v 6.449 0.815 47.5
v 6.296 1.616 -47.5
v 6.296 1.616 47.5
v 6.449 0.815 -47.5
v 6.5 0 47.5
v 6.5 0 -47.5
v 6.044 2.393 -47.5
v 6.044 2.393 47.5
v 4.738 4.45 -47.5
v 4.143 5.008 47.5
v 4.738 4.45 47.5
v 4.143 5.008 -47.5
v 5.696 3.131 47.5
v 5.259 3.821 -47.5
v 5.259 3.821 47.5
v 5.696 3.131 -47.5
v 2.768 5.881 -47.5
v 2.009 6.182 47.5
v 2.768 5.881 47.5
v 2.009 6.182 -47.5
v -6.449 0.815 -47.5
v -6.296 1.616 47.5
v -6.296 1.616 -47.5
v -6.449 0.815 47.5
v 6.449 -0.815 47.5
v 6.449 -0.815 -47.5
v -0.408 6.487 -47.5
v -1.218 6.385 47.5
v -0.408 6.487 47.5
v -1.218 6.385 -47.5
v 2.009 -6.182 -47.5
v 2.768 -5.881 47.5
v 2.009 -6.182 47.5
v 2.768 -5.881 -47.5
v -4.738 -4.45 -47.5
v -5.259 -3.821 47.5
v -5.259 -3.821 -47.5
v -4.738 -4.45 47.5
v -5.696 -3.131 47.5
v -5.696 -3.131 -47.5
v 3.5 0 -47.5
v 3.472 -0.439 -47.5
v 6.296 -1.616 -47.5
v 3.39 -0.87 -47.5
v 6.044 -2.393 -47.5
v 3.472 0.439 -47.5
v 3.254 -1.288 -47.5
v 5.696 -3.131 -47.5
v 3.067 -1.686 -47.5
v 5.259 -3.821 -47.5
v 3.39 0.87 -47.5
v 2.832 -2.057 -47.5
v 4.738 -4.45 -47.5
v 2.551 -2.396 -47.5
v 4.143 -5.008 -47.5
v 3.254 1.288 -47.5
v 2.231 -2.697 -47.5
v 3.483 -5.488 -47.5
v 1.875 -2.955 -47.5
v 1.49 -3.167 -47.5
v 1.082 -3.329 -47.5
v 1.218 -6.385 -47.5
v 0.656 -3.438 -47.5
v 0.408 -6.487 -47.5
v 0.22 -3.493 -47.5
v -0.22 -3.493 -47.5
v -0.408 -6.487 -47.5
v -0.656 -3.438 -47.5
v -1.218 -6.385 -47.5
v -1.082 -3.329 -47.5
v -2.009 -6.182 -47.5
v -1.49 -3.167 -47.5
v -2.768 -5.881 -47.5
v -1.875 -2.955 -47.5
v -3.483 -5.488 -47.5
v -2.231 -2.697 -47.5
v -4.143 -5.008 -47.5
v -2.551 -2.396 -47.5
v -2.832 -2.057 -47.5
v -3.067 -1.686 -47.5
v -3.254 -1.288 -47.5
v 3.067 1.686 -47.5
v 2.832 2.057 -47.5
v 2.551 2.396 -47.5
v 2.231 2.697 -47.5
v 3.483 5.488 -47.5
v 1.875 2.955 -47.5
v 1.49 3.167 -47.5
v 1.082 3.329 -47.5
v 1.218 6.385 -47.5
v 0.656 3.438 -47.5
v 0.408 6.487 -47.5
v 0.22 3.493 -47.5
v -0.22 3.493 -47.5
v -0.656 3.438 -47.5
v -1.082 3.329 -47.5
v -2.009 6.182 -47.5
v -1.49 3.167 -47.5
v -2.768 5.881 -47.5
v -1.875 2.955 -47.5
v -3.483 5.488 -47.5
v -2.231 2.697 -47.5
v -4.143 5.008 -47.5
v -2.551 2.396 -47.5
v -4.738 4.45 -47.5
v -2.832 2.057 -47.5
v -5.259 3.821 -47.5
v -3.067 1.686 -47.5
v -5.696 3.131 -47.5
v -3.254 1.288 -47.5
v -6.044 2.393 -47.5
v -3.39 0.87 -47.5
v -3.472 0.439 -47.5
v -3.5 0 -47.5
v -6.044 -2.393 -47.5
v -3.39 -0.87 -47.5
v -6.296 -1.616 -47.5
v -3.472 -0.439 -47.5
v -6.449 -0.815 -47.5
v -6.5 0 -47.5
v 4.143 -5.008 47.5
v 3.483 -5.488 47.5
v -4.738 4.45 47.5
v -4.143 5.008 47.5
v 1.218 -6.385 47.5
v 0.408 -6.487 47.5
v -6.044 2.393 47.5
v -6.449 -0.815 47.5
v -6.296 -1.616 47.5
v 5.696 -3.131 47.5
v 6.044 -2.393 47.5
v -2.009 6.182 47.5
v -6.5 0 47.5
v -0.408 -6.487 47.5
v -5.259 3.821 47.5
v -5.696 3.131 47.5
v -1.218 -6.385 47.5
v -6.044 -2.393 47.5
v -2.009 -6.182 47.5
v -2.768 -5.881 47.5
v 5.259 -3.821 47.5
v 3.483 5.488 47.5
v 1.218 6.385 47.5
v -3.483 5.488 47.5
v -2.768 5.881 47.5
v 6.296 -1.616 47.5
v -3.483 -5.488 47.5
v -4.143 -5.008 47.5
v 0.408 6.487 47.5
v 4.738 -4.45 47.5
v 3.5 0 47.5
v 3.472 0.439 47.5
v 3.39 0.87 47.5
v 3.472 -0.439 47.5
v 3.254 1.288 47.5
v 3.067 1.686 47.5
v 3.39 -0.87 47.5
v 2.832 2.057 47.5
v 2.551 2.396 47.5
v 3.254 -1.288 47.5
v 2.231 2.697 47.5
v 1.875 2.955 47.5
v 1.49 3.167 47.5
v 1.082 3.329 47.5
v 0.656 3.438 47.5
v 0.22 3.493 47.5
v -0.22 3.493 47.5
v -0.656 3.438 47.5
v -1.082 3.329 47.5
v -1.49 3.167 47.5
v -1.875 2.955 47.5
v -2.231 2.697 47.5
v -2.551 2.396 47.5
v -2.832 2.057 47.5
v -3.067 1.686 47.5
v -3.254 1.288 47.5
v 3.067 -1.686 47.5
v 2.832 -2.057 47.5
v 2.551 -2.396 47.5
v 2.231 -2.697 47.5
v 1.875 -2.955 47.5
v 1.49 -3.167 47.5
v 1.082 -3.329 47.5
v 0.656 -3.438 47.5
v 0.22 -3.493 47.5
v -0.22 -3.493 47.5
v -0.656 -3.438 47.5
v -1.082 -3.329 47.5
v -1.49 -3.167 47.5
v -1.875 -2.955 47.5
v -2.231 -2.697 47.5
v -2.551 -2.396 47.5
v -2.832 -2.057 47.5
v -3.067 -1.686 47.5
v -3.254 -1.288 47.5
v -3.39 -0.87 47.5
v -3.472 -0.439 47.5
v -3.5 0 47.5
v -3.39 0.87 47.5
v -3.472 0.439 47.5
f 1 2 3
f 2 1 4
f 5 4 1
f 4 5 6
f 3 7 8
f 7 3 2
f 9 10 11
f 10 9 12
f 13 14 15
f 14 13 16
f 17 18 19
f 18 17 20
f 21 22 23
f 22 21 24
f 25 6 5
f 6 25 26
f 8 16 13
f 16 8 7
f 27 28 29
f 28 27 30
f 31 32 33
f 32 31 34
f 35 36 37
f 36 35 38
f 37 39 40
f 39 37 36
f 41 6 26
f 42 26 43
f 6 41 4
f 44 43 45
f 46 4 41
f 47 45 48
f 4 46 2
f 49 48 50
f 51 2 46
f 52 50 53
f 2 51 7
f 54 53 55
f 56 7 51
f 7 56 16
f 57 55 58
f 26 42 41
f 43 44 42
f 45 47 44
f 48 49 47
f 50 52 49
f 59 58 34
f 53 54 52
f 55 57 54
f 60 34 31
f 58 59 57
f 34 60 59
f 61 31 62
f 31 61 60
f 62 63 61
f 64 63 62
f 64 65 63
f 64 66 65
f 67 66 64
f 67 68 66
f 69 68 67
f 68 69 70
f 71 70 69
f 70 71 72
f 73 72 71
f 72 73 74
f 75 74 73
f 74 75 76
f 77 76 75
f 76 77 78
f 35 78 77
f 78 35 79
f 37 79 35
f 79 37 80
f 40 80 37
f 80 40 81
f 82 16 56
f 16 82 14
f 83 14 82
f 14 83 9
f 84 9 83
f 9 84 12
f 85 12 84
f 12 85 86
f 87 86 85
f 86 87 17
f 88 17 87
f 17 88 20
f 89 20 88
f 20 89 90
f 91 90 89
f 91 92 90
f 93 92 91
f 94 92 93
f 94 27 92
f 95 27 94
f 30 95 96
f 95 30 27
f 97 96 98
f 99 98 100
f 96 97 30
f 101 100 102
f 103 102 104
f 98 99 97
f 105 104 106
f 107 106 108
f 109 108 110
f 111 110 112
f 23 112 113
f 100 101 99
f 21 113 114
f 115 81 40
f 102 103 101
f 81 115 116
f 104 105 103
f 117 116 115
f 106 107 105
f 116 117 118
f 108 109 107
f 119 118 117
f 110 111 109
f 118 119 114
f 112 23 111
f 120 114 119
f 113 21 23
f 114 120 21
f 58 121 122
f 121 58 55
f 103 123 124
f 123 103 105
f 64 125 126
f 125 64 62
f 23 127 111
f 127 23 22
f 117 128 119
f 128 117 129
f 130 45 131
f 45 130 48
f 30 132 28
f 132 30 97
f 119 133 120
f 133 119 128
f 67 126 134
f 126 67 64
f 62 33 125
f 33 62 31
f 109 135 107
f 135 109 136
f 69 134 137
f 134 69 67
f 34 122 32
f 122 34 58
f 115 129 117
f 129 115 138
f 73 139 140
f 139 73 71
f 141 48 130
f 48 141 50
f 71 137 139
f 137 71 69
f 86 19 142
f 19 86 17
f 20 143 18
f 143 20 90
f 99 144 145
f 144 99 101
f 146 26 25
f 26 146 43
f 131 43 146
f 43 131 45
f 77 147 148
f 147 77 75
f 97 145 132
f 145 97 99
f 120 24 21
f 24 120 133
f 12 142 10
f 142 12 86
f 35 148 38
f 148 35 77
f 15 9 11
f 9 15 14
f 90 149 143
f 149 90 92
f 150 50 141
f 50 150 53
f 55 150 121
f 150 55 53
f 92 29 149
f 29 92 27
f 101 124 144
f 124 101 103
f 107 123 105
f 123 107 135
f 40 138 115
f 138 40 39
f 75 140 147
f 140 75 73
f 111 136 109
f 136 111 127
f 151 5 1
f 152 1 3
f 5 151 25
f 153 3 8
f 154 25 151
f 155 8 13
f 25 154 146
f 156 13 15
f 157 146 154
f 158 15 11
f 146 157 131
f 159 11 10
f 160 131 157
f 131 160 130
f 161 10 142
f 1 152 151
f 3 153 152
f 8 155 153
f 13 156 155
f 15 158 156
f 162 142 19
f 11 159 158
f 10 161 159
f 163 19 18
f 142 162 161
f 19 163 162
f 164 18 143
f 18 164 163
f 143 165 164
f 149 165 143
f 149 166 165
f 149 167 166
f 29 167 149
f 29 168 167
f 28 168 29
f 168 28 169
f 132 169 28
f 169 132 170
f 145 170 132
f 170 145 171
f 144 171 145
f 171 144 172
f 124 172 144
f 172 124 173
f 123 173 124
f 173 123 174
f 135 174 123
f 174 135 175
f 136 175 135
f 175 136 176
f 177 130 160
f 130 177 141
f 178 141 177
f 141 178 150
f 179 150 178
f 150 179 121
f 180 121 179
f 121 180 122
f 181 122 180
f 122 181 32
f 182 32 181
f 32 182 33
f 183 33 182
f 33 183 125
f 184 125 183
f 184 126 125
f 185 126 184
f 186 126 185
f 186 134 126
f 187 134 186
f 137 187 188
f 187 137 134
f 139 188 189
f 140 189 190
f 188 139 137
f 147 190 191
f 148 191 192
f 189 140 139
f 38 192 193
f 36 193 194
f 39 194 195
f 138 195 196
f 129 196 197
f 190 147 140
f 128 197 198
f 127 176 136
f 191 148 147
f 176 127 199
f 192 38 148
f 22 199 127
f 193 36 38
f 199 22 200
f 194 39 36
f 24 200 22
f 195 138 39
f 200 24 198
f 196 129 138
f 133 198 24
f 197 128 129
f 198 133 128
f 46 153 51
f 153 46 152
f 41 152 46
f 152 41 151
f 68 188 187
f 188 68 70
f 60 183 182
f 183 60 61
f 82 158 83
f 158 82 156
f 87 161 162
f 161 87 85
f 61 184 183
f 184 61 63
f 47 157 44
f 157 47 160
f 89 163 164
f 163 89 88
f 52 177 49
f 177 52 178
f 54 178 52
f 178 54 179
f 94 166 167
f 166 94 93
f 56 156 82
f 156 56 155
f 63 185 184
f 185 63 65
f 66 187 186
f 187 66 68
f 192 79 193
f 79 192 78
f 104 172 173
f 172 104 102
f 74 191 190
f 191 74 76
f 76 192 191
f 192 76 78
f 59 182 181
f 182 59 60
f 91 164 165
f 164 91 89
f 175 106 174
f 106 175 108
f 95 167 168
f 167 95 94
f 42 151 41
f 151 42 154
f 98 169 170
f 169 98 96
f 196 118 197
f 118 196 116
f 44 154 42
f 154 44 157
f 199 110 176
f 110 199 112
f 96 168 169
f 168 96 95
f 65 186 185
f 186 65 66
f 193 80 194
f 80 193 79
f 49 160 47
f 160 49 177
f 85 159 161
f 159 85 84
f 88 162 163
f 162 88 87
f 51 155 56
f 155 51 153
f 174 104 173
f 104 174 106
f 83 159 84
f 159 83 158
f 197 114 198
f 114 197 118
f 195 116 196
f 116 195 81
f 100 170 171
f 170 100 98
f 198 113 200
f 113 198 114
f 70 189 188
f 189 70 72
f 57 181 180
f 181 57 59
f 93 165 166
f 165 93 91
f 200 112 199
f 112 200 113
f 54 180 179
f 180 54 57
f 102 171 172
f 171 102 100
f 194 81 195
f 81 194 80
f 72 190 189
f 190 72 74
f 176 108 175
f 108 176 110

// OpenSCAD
$fn = 50;


difference() {
	union() {
		translate(v = [0, 0, -47.5000000000]) {
			cylinder(h = 95, r = 6.5000000000);
		}
	}
	union() {
		translate(v = [0, 0, -100.0000000000]) {
			cylinder(h = 200, r = 3.5000000000);
		}
	}
}
